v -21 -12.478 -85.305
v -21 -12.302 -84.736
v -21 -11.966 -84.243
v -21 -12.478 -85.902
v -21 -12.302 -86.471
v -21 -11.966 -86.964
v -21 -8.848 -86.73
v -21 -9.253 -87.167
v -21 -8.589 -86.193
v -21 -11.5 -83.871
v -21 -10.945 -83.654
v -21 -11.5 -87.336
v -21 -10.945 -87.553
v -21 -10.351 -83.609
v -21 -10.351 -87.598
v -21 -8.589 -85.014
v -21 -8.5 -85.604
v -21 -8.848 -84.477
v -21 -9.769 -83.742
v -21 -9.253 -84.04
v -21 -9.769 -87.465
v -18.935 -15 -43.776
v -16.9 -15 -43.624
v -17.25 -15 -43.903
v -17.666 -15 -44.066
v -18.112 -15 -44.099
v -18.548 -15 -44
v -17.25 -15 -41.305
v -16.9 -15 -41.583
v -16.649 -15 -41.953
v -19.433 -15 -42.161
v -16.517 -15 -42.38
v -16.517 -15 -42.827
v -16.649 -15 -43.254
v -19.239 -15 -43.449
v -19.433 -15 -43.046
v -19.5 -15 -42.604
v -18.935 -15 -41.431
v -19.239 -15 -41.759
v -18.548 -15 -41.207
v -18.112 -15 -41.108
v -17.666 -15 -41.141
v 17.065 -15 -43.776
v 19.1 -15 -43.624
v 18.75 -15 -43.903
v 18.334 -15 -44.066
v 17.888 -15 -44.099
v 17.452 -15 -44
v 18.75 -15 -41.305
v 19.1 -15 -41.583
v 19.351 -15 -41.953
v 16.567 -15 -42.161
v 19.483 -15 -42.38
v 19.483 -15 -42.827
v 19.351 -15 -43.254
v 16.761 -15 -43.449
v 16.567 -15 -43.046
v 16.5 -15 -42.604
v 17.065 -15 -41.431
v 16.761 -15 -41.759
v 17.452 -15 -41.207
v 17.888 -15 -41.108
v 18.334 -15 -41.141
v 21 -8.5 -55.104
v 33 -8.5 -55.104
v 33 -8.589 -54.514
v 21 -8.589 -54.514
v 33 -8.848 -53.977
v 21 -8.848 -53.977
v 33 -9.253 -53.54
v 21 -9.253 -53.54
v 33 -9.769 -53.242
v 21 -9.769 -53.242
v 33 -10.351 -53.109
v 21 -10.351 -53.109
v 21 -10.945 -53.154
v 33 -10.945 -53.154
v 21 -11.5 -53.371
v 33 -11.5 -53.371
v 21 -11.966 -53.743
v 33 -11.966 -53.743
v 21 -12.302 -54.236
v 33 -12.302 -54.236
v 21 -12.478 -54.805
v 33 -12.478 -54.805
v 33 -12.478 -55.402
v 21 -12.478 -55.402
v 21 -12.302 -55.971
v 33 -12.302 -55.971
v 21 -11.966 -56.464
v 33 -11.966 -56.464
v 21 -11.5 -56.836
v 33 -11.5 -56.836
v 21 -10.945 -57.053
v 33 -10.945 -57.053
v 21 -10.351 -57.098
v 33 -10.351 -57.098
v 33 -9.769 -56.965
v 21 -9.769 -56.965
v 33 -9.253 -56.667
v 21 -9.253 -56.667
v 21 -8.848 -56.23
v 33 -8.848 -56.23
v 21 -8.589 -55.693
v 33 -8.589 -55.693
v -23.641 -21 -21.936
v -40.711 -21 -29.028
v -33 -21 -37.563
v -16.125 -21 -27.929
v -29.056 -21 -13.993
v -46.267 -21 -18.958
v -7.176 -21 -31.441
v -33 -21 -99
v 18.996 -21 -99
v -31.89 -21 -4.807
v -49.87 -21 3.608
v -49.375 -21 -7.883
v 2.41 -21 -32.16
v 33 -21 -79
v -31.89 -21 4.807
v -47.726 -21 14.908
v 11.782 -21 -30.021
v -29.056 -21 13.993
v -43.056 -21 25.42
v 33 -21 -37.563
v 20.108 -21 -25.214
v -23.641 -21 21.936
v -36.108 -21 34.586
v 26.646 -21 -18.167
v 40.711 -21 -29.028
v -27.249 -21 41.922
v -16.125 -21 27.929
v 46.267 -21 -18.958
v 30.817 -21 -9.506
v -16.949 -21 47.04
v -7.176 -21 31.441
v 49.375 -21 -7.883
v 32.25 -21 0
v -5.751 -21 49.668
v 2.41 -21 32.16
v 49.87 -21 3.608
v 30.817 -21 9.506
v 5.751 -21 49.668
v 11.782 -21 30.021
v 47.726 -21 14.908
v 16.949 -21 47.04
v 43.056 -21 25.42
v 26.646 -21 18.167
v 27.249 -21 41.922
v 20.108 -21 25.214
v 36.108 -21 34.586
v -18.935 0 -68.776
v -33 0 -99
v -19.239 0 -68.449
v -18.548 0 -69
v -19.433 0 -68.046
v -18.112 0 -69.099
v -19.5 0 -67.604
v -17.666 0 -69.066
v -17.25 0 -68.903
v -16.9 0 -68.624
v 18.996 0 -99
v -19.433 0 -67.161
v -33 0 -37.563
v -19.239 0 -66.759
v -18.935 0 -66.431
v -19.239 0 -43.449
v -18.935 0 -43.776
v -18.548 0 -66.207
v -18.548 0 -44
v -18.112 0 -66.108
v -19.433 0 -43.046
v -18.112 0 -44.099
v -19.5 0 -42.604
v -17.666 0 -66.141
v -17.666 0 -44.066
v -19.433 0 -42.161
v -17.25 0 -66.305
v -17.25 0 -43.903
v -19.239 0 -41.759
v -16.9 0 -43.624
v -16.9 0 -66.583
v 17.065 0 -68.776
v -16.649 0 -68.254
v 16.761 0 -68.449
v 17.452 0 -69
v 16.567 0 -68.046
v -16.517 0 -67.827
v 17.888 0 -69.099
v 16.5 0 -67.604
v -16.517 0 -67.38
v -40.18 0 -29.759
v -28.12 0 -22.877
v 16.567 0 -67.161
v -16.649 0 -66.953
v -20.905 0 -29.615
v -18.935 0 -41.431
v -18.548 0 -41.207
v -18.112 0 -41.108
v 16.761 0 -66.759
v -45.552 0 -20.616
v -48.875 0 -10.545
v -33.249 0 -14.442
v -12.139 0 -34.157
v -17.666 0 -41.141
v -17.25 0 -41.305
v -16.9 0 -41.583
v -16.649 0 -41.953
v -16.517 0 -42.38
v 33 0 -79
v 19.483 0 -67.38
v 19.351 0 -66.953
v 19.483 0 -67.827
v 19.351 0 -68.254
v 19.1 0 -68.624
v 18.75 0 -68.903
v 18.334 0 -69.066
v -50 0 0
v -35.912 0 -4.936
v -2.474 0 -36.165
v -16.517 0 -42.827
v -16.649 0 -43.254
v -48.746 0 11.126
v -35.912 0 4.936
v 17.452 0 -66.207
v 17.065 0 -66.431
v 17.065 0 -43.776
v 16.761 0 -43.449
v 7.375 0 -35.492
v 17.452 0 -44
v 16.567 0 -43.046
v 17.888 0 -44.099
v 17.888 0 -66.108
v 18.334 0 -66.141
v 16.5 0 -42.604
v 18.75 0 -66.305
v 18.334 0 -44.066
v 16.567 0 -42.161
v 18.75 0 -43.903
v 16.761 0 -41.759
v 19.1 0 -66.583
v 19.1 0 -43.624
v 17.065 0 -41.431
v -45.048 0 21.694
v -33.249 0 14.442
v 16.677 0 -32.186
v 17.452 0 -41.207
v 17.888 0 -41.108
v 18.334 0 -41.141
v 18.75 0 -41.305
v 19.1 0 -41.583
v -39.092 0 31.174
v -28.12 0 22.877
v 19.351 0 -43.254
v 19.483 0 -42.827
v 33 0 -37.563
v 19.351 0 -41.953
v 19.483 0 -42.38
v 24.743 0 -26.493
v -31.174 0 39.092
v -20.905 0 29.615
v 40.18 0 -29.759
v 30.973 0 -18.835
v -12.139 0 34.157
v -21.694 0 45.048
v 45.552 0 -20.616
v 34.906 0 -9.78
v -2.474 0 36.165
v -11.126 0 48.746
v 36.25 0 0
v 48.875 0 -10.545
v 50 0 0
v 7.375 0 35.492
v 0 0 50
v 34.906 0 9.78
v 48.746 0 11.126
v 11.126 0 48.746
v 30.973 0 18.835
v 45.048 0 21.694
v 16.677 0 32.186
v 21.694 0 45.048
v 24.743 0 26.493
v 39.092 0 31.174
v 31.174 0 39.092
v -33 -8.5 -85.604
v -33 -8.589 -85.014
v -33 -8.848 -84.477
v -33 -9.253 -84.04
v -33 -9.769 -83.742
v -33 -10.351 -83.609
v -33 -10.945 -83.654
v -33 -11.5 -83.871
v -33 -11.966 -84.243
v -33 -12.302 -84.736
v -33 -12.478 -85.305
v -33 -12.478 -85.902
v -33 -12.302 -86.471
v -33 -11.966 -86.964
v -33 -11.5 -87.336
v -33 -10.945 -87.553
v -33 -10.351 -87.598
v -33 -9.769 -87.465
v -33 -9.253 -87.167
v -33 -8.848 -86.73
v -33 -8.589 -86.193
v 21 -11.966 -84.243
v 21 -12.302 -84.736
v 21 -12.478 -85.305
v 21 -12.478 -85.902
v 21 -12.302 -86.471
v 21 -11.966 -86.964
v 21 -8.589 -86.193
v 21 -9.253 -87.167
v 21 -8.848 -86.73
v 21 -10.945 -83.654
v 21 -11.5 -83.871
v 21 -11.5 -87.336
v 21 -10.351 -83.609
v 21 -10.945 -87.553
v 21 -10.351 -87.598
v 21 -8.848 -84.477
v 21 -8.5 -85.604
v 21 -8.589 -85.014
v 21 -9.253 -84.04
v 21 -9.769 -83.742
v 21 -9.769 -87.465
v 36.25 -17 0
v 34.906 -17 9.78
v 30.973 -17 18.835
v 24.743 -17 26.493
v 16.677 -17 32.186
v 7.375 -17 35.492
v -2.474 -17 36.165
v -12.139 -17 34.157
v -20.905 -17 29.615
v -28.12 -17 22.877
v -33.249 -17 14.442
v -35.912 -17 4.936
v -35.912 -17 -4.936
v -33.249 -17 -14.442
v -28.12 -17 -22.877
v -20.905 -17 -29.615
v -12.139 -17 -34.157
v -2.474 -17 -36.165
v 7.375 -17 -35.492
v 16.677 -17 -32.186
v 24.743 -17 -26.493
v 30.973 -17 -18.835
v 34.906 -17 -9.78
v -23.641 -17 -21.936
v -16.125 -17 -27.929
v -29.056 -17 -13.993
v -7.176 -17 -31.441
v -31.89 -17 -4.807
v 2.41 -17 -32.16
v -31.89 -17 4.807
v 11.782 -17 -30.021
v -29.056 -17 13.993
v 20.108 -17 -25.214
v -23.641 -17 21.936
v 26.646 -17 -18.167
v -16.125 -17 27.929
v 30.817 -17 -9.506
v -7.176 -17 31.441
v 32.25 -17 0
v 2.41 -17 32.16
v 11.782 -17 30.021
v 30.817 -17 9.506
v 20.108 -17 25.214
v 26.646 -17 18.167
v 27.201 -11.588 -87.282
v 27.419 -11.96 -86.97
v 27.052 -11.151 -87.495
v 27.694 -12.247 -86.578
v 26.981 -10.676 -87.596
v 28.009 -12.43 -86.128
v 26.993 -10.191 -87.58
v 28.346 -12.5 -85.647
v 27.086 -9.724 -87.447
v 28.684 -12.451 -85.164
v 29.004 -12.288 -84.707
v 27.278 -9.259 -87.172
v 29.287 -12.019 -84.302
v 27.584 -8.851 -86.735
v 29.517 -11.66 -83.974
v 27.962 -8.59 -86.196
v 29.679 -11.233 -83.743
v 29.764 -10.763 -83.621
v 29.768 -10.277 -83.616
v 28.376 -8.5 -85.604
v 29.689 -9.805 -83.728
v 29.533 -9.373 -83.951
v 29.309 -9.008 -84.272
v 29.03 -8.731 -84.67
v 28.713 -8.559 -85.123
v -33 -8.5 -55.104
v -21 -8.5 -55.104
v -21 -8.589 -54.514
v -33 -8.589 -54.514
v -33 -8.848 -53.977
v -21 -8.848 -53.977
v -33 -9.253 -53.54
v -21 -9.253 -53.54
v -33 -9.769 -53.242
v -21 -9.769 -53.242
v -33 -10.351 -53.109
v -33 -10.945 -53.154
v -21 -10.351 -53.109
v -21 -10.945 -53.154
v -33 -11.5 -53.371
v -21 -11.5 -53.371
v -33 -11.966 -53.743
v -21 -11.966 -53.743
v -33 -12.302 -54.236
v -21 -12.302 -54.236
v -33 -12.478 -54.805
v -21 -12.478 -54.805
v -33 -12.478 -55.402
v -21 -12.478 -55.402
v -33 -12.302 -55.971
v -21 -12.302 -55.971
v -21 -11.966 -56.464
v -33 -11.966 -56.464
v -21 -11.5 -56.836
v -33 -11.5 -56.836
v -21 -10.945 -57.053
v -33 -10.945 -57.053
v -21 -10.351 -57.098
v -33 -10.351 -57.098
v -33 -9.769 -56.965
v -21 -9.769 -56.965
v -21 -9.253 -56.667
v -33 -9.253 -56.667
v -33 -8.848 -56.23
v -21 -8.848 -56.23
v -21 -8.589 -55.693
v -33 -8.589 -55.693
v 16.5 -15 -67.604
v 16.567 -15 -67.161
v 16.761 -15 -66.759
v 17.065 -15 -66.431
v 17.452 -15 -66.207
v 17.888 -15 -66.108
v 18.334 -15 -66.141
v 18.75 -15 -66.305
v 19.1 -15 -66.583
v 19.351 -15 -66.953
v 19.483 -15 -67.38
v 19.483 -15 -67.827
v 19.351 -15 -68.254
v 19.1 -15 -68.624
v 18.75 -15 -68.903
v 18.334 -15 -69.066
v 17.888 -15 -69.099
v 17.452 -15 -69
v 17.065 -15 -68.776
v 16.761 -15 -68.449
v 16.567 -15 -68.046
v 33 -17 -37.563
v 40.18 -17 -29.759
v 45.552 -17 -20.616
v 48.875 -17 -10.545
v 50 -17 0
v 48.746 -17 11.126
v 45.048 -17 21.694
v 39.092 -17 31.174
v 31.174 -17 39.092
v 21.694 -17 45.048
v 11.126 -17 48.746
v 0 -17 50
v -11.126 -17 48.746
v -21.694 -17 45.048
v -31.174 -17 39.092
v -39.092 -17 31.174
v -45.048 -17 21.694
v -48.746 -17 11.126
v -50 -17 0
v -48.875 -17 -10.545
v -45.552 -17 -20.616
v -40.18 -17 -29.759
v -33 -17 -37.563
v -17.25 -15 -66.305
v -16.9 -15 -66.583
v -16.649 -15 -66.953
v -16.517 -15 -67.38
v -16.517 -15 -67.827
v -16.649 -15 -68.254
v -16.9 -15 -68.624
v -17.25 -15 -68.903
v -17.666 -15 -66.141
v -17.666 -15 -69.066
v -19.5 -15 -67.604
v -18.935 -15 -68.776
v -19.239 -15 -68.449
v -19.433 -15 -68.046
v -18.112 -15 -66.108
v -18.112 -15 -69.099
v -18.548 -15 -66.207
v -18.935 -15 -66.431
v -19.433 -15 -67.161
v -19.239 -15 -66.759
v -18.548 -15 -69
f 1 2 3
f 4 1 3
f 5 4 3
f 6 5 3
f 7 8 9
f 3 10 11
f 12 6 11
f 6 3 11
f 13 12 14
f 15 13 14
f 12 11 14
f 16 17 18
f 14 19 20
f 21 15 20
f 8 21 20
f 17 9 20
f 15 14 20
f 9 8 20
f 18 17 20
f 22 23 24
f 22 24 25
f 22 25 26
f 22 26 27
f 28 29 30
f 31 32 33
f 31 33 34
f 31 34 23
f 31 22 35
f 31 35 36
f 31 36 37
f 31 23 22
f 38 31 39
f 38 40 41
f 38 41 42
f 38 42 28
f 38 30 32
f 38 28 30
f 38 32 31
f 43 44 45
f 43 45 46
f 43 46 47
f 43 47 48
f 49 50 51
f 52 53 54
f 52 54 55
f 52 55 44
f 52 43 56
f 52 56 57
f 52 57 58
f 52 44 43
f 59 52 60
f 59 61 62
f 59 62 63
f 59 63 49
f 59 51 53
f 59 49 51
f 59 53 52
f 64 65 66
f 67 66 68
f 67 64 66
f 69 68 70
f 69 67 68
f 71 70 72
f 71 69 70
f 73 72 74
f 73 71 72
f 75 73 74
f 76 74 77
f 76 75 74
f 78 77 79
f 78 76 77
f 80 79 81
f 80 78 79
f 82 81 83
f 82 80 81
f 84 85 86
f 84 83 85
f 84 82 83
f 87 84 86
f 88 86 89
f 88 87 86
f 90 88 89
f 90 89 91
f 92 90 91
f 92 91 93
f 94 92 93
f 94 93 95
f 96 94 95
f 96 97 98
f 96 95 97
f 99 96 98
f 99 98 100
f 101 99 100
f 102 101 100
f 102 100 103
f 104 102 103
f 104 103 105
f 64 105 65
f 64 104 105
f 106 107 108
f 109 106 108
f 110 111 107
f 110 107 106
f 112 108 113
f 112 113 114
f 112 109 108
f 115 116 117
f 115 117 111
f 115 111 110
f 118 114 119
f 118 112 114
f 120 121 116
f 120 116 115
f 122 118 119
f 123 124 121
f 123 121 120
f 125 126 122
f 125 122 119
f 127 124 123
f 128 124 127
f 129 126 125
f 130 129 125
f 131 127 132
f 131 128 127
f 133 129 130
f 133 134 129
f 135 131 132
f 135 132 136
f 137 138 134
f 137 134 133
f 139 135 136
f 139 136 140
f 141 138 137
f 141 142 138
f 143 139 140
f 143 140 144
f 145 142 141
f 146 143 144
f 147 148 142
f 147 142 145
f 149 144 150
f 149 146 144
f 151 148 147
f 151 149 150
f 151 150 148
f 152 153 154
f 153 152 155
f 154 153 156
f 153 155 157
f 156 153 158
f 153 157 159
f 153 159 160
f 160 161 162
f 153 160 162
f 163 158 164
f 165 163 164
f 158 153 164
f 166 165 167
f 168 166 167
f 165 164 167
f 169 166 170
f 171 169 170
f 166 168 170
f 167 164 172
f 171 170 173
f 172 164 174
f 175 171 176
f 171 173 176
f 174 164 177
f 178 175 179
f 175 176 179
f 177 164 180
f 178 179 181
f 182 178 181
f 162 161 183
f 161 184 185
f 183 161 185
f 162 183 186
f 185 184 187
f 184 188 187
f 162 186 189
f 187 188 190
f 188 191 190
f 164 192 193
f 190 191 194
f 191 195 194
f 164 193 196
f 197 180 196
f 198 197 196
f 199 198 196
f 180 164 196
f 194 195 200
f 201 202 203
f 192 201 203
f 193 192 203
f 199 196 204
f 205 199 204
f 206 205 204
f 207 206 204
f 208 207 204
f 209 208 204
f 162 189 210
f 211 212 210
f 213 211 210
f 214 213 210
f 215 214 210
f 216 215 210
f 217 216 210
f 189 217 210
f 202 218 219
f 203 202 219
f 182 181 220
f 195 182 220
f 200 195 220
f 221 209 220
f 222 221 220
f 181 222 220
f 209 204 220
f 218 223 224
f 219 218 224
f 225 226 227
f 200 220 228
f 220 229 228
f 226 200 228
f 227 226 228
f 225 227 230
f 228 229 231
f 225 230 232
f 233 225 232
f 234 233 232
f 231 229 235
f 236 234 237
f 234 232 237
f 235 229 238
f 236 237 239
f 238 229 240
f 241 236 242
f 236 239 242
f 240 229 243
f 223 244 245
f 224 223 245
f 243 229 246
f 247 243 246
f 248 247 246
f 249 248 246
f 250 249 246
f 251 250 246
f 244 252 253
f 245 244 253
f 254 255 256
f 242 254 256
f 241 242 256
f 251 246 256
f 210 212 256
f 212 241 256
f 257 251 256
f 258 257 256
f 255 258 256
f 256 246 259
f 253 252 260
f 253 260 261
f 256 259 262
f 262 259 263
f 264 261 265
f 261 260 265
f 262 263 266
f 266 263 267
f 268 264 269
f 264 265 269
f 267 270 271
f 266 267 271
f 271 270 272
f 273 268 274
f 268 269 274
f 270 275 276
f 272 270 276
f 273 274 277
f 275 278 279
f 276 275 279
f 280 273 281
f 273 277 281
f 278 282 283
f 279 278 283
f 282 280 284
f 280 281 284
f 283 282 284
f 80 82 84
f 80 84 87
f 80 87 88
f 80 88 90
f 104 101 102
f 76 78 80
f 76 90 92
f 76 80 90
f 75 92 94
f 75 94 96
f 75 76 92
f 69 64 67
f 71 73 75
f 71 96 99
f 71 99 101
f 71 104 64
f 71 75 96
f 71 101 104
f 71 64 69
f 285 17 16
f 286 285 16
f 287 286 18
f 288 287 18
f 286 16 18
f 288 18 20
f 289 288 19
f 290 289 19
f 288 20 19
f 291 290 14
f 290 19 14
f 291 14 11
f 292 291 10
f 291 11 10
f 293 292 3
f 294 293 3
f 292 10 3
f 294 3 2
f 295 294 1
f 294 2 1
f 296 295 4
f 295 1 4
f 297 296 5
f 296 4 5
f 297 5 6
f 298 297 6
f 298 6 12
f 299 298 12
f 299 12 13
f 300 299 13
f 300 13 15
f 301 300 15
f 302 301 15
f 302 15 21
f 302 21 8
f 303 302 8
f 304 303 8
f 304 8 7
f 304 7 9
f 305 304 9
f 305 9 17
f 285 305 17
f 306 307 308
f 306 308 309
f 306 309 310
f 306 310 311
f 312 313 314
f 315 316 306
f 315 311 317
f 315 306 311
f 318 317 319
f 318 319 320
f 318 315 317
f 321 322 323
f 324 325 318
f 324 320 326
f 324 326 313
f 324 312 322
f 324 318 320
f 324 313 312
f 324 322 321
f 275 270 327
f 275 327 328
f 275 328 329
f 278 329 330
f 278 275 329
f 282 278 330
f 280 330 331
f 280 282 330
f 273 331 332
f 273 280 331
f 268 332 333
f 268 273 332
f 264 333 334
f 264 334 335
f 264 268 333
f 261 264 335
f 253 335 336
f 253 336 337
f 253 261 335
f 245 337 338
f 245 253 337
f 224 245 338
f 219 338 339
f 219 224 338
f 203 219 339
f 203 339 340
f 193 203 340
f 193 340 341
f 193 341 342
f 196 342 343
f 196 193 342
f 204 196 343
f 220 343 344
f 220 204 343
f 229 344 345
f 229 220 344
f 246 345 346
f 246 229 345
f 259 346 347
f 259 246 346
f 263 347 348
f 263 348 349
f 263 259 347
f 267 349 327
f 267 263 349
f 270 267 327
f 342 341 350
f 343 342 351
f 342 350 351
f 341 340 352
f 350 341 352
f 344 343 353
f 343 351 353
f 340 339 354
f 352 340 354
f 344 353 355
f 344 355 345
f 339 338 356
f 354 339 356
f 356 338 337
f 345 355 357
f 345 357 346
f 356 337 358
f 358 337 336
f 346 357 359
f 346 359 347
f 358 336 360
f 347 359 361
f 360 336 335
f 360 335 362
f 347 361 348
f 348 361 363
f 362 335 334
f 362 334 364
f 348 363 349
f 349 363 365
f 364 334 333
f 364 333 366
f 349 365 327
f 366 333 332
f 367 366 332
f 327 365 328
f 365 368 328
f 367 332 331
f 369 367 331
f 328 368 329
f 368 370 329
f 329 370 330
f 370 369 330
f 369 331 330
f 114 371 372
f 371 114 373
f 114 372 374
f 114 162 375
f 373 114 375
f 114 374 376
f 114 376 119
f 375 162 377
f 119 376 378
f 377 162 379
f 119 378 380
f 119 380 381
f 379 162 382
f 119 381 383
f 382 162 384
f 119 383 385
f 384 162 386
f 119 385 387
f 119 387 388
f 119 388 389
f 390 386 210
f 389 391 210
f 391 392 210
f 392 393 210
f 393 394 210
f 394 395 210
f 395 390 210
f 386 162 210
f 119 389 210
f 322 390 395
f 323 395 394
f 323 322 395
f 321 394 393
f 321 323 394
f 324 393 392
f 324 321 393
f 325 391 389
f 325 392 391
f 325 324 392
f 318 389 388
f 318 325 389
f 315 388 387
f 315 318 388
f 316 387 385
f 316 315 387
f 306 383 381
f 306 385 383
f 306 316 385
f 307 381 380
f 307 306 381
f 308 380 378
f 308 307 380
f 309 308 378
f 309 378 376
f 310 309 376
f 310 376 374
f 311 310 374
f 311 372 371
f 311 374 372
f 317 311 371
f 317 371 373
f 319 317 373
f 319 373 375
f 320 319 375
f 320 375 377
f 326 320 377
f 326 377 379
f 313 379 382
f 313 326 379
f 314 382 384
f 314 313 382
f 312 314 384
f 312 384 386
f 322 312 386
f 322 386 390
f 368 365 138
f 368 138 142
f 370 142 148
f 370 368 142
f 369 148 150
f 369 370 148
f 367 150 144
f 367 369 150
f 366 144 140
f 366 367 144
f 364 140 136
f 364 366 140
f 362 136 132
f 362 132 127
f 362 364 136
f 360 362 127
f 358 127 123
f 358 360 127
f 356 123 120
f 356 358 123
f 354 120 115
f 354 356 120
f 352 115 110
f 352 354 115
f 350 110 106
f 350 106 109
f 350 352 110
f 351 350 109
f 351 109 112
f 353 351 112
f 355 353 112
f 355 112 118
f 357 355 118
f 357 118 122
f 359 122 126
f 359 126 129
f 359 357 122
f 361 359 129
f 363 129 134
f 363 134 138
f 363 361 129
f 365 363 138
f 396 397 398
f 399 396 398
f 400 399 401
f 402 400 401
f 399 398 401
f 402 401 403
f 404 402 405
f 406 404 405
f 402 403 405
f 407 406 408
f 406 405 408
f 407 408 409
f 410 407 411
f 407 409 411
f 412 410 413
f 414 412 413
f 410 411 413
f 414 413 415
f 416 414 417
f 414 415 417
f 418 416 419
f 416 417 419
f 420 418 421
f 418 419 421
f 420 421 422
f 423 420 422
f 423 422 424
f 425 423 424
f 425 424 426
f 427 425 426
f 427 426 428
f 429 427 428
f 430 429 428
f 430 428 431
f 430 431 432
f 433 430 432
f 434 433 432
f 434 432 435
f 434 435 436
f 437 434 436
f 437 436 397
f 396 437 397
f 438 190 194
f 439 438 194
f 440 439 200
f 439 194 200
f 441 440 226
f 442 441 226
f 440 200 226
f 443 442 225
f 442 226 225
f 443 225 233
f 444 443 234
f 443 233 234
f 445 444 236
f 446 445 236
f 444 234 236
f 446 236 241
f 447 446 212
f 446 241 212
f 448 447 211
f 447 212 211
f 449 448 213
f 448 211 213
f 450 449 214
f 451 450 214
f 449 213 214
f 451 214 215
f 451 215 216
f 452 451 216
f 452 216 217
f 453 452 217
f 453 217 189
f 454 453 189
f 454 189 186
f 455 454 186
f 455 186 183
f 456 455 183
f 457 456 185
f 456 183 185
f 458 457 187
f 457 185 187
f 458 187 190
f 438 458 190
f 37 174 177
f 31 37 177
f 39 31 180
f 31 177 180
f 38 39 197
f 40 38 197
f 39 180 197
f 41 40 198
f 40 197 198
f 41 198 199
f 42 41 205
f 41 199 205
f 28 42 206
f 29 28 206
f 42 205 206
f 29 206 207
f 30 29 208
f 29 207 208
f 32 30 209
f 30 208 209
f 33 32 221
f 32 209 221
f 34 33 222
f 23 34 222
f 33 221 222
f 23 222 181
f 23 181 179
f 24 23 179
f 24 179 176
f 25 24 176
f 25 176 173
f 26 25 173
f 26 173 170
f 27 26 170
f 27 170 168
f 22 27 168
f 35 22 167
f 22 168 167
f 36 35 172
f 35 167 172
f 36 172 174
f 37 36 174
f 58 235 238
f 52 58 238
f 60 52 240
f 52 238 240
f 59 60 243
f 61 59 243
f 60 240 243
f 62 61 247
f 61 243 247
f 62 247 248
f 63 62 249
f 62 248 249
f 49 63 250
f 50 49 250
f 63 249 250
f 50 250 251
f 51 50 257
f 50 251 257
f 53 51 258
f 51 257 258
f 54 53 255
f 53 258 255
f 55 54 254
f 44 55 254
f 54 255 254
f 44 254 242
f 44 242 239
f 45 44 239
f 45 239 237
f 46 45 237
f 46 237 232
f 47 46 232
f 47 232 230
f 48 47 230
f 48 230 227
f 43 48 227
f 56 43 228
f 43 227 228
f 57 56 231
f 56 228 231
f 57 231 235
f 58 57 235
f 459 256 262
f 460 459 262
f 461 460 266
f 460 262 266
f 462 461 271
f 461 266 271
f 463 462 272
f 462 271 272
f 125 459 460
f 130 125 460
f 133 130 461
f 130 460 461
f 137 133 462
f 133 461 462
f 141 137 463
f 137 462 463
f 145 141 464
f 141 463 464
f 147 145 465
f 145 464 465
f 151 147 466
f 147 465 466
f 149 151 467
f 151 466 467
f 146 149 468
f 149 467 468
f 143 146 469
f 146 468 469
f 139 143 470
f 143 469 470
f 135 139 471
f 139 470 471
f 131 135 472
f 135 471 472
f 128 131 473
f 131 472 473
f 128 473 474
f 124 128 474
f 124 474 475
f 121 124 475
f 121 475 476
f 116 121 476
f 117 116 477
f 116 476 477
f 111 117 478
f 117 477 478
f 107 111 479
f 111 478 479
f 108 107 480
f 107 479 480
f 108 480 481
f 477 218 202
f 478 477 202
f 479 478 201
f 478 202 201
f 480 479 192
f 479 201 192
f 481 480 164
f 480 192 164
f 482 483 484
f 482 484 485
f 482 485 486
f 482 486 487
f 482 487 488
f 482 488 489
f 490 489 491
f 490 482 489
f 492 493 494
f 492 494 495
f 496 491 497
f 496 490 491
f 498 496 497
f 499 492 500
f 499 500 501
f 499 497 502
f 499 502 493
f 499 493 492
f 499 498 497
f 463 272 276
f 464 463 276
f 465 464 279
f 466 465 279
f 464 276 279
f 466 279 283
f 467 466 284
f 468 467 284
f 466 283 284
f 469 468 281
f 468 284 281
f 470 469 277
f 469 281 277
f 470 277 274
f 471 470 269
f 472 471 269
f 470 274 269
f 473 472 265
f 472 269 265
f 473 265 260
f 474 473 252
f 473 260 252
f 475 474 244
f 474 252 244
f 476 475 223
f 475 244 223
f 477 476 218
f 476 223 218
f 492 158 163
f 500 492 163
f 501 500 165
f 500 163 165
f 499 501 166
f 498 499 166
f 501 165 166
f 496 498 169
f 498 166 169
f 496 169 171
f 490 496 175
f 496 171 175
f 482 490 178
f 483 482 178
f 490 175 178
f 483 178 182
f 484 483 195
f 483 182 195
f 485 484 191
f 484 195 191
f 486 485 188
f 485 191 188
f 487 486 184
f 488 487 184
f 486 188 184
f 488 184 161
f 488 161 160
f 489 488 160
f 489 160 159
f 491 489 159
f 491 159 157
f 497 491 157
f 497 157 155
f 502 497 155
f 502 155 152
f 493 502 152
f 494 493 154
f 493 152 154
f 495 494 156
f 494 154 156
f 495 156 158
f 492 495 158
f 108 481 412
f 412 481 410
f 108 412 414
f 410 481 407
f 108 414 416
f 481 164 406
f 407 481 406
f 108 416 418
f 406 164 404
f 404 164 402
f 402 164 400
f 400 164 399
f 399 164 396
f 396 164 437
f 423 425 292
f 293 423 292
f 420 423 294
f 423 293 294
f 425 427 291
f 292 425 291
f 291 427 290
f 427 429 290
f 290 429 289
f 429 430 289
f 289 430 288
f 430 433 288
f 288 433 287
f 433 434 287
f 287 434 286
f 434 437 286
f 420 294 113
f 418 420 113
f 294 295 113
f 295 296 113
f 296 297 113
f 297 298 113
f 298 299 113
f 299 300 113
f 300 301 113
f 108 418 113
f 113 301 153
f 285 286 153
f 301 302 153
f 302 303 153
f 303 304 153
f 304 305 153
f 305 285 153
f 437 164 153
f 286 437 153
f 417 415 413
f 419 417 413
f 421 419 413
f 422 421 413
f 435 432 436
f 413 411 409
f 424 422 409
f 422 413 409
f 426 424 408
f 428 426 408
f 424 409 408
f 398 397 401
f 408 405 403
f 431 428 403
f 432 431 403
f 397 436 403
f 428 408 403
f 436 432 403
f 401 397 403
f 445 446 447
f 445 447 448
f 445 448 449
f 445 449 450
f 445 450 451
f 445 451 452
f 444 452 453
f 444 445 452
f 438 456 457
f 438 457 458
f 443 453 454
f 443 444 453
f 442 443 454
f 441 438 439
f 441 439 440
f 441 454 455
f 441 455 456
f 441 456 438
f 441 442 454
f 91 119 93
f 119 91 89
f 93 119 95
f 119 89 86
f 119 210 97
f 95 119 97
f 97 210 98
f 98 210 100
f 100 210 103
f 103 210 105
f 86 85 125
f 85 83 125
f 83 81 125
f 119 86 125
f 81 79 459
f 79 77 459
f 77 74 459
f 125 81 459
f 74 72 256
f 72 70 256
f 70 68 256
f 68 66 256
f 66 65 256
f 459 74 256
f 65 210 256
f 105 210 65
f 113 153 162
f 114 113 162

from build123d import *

# Parameters (mm, degrees)
F0_R      = 36.25
F1_DEPTH  = 17
F2_R      = 32.25
F3_DEPTH  = 4
F4_R      = 1.5
F5_DEPTH  = 15
F8_DEPTH  = 25
F11_DEPTH = 25


with BuildPart() as f1:
    # F0 (on Front) → F1 (new body)
    with BuildSketch(Plane.XZ):
        with BuildLine():
            ThreePointArc((33, -37.56328), (45.552168, -20.615528), (50, 0))
            ThreePointArc((50, 0), (0, 50), (-50, 0))
            ThreePointArc((-50, 0), (-45.552168, -20.615528), (-33, -37.56328))
            Line((-33, -37.56328), (-33, -79))
            Line((-33, -79), (-33, -99))
            Line((-33, -99), (-18.995849, -99))
            Line((-18.995849, -99), (0, -99))
            Line((0, -99), (18.995849, -99))
            Line((18.995849, -99), (33, -79))
            Line((33, -79), (33, -37.56328))
        make_face()
        Circle(F0_R, mode=Mode.SUBTRACT)
    extrude(amount=F1_DEPTH)

    # F2 (on face) → F3 (join)
    with BuildSketch(Plane.XZ.offset(17)):
        with BuildLine():
            Line((33, -79), (33, -37.56328))
            ThreePointArc((33, -37.56328), (0, 50), (-33, -37.56328))
            Line((-33, -37.56328), (-33, -99))
            Line((-33, -99), (18.995849, -99))
            Line((18.995849, -99), (33, -79))
        make_face()
        Circle(F2_R, mode=Mode.SUBTRACT)
    extrude(amount=F3_DEPTH)

    # F4 (on face) → F5 (cut)
    with BuildSketch(Plane(origin=(0, 0, 0), x_dir=(-1, 0, 0), z_dir=(0, 1, 0))):
        with Locations((-18, -42.60355)):
            Circle(F4_R)
        with Locations((18, -42.60355)):
            Circle(F4_R)
        with Locations((18, -67.60355)):
            Circle(F4_R)
        with Locations((-18, -67.60355)):
            Circle(F4_R)
    extrude(amount=-F5_DEPTH, mode=Mode.SUBTRACT)

    # F7 (on offset) → F8 (cut)
    with BuildSketch(Plane.YZ.offset(21)):
        with BuildLine():
            ThreePointArc((-12.5, -85.60355), (-10.5, -87.60355), (-8.5, -85.60355))
            Line((-8.5, -85.60355), (-12.5, -85.60355))
        make_face()
        with BuildLine():
            Line((-12.5, -85.60355), (-8.5, -85.60355))
            ThreePointArc((-8.5, -85.60355), (-10.5, -83.60355), (-12.5, -85.60355))
        make_face()
        with BuildLine():
            ThreePointArc((-12.5, -55.10355), (-10.5, -57.10355), (-8.5, -55.10355))
            Line((-8.5, -55.10355), (-12.5, -55.10355))
        make_face()
        with BuildLine():
            Line((-12.5, -55.10355), (-8.5, -55.10355))
            ThreePointArc((-8.5, -55.10355), (-10.5, -53.10355), (-12.5, -55.10355))
        make_face()
    extrude(amount=F8_DEPTH, mode=Mode.SUBTRACT)

    # F10 (on offset) → F11 (cut)
    with BuildSketch(Plane.YZ.offset(-21)):
        with BuildLine():
            ThreePointArc((-12.5, -85.60355), (-10.5, -87.60355), (-8.5, -85.60355))
            Line((-8.5, -85.60355), (-12.5, -85.60355))
        make_face()
        with BuildLine():
            Line((-12.5, -85.60355), (-8.5, -85.60355))
            ThreePointArc((-8.5, -85.60355), (-10.5, -83.60355), (-12.5, -85.60355))
        make_face()
        with BuildLine():
            ThreePointArc((-12.5, -55.10355), (-10.5, -57.10355), (-8.5, -55.10355))
            Line((-8.5, -55.10355), (-12.5, -55.10355))
        make_face()
        with BuildLine():
            Line((-12.5, -55.10355), (-8.5, -55.10355))
            ThreePointArc((-8.5, -55.10355), (-10.5, -53.10355), (-12.5, -55.10355))
        make_face()
    extrude(amount=-F11_DEPTH, mode=Mode.SUBTRACT)


solid = f1.part
